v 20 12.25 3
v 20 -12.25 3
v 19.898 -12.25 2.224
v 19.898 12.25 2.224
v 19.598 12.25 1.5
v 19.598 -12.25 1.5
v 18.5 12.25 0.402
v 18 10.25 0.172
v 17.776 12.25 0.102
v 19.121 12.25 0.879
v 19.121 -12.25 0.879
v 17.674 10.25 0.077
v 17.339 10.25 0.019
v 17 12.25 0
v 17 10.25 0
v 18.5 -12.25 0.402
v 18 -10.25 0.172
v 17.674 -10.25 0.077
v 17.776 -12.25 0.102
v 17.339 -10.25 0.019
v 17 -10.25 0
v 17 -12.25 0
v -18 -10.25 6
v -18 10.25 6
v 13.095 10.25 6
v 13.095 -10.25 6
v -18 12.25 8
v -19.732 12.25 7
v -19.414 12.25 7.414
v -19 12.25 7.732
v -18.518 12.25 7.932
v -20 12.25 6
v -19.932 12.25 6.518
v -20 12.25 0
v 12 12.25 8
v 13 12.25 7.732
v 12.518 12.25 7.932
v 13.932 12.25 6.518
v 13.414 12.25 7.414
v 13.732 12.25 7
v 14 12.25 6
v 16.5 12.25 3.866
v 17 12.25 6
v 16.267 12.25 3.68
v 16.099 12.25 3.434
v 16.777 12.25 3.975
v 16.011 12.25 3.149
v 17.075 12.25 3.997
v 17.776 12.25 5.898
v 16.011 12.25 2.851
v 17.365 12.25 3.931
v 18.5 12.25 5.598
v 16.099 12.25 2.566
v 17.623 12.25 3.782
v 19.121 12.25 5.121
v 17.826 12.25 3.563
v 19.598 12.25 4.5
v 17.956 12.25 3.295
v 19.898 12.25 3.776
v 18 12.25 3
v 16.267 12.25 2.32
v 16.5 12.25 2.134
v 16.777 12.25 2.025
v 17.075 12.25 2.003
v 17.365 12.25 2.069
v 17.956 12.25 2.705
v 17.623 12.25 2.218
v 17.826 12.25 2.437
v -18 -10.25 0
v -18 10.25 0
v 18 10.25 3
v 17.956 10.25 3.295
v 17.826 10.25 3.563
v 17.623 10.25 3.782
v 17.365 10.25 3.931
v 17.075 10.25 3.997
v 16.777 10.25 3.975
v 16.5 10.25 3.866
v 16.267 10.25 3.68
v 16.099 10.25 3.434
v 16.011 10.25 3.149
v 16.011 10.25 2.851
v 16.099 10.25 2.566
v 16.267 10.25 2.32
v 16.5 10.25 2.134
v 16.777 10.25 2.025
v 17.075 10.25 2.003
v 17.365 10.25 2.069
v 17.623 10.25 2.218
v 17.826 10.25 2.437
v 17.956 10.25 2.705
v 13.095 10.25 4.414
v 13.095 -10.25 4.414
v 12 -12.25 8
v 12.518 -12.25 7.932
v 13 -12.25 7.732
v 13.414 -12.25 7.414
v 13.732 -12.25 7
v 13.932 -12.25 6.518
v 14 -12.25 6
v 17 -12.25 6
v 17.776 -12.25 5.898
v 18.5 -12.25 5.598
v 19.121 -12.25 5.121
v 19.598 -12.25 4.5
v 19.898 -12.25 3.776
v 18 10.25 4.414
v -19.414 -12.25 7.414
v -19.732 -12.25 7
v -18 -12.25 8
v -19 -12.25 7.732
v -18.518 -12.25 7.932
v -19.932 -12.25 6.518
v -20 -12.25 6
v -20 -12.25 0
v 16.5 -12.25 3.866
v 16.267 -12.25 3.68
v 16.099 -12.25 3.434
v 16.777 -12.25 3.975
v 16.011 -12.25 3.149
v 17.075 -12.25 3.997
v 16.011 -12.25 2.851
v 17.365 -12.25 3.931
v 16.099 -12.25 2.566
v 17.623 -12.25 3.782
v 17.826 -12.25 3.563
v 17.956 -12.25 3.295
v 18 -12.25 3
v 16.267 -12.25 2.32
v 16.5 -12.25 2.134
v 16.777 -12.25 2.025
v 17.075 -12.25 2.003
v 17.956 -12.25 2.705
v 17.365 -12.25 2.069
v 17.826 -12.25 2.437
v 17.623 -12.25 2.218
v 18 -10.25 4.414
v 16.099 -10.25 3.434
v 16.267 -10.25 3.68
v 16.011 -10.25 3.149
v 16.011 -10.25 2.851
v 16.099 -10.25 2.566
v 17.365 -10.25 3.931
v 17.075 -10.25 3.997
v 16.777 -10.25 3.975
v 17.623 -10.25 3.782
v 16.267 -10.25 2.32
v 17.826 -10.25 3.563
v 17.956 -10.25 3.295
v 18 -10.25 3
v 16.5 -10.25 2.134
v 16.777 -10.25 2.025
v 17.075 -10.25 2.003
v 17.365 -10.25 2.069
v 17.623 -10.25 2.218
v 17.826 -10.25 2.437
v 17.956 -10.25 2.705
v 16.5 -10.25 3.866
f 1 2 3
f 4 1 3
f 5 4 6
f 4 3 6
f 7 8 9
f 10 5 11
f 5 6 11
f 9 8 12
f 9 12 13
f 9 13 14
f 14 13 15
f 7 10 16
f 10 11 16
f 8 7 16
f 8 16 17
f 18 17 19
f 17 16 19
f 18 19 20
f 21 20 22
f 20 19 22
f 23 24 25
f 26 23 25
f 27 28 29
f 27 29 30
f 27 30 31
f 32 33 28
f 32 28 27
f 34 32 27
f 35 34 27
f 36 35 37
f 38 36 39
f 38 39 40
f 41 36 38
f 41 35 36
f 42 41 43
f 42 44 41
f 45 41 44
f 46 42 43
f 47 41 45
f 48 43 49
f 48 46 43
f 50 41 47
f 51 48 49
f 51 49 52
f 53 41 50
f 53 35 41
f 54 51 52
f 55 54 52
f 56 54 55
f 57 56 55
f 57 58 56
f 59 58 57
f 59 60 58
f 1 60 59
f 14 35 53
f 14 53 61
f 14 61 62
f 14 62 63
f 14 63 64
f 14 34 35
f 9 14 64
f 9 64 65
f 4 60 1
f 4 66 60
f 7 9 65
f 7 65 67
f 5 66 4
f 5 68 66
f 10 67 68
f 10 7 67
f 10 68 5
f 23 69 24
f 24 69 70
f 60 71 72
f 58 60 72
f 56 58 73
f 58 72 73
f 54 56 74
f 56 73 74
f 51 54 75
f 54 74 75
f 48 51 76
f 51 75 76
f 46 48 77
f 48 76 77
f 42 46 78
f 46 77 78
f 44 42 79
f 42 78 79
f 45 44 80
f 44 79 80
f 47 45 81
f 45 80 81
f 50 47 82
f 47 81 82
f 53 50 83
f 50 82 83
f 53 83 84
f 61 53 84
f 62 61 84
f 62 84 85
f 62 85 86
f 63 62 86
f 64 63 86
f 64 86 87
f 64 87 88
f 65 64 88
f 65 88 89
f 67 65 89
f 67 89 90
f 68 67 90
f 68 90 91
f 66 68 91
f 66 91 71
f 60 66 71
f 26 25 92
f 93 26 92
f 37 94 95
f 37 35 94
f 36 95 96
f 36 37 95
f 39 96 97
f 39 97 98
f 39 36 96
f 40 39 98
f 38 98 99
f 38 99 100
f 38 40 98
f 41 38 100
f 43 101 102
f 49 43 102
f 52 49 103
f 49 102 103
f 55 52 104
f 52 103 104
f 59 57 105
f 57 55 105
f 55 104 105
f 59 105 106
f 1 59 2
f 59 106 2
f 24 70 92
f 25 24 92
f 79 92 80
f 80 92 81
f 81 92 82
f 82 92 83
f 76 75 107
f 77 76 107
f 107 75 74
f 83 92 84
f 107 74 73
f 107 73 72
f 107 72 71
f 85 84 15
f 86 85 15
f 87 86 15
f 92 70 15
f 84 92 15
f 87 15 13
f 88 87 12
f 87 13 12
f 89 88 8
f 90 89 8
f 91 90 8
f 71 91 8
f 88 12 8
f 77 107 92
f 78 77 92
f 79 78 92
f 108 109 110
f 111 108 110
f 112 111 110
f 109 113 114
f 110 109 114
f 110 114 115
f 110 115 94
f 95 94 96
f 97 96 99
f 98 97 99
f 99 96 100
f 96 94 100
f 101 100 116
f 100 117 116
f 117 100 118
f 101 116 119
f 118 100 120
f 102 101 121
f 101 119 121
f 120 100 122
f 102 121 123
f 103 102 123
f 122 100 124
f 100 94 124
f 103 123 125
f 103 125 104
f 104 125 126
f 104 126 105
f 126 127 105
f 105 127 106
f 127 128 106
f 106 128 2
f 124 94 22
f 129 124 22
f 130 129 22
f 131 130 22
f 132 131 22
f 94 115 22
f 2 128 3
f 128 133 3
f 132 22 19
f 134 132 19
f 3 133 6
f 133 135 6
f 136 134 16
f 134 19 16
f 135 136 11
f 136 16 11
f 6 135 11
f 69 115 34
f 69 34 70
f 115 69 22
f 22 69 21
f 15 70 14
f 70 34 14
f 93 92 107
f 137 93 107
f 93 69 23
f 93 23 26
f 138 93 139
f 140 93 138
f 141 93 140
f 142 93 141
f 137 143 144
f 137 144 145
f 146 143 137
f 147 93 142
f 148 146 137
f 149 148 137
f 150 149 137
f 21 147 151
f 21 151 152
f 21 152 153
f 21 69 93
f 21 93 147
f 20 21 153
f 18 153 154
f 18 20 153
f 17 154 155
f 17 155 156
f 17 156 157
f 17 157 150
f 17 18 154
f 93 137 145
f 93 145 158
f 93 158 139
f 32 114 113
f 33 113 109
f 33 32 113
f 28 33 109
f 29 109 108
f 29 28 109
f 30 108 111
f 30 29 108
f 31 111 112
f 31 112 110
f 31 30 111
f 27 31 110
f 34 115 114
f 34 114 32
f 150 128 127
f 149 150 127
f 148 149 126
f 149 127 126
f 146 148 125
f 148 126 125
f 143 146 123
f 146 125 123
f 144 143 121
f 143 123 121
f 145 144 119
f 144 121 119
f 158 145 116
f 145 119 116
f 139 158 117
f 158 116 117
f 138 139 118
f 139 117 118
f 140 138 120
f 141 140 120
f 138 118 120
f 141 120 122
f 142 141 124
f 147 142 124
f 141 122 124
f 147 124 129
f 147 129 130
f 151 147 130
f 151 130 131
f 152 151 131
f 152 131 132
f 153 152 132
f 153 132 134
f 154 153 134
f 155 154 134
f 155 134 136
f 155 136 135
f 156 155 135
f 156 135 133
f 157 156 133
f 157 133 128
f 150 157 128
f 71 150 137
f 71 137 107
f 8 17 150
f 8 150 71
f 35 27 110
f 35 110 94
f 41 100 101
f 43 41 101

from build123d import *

# Parameters (mm, degrees)
F0_W     = 40
F0_H     = 24.5
F1_DEPTH = 8
F2_T     = -2
F3_R     = 1
F4_DEPTH = 25
F5_R     = 1.99999
F7_DEPTH = 22.5


# Not quite as in the source:
# - a fillet or chamfer is up to 0.001 mm smaller than in the source, because OpenCascade refuses the exact size


with BuildPart() as f1:
    # F0 (on Top) → F1 (new body)
    with BuildSketch(Plane.XY):
        Rectangle(F0_W, F0_H)
    extrude(amount=F1_DEPTH)

    # F2
    f2_openings = [f1.faces().sort_by_distance(p)[0] for p in [
        (0, 0, 0),
    ]]
    offset(amount=F2_T, openings=f2_openings)

    # F3 (on face) → F4 (cut)
    with BuildSketch(Plane.XZ.offset(12.25)):
        with Locations((17, 3)):
            Circle(F3_R)
        with BuildLine():
            ThreePointArc((17, 6), (19.1213203436, 5.1213203436), (20, 3))
            Line((20, 3), (20, 8))
            Line((20, 8), (14, 8))
            Line((14, 8), (14, 6))
            Line((14, 6), (17, 6))
        make_face()
        with BuildLine():
            ThreePointArc((20, 3), (19.1213203436, 0.8786796564), (17, 0))
            Line((17, 0), (20, 0))
            Line((20, 0), (20, 3))
        make_face()
    extrude(amount=-F4_DEPTH, mode=Mode.SUBTRACT)

    # F5 (radius 2 in the source; OpenCascade refuses exactly that, so slightly less here)
    f5_edges = [f1.edges().sort_by_distance(p)[0] for p in [
        (-20, 0, 8),
        (14, 0, 8),
    ]]
    fillet(f5_edges, radius=F5_R)

    # F6 (on face) → F7 (join)
    with BuildSketch(Plane.XZ.offset(-10.25)):
        with BuildLine():
            Line((14, 6), (13.095, 6))
            Line((13.095, 6), (13.095, 4.4142135624))
            Line((13.095, 4.4142135624), (18, 4.4142135624))
            Line((18, 4.4142135624), (18, 5.8284271247))
            ThreePointArc((18, 5.8284271247), (17.5073059362, 5.956795679), (17, 6))
            Line((17, 6), (14, 6))
        make_face()
    extrude(amount=F7_DEPTH)


solid = f1.part
